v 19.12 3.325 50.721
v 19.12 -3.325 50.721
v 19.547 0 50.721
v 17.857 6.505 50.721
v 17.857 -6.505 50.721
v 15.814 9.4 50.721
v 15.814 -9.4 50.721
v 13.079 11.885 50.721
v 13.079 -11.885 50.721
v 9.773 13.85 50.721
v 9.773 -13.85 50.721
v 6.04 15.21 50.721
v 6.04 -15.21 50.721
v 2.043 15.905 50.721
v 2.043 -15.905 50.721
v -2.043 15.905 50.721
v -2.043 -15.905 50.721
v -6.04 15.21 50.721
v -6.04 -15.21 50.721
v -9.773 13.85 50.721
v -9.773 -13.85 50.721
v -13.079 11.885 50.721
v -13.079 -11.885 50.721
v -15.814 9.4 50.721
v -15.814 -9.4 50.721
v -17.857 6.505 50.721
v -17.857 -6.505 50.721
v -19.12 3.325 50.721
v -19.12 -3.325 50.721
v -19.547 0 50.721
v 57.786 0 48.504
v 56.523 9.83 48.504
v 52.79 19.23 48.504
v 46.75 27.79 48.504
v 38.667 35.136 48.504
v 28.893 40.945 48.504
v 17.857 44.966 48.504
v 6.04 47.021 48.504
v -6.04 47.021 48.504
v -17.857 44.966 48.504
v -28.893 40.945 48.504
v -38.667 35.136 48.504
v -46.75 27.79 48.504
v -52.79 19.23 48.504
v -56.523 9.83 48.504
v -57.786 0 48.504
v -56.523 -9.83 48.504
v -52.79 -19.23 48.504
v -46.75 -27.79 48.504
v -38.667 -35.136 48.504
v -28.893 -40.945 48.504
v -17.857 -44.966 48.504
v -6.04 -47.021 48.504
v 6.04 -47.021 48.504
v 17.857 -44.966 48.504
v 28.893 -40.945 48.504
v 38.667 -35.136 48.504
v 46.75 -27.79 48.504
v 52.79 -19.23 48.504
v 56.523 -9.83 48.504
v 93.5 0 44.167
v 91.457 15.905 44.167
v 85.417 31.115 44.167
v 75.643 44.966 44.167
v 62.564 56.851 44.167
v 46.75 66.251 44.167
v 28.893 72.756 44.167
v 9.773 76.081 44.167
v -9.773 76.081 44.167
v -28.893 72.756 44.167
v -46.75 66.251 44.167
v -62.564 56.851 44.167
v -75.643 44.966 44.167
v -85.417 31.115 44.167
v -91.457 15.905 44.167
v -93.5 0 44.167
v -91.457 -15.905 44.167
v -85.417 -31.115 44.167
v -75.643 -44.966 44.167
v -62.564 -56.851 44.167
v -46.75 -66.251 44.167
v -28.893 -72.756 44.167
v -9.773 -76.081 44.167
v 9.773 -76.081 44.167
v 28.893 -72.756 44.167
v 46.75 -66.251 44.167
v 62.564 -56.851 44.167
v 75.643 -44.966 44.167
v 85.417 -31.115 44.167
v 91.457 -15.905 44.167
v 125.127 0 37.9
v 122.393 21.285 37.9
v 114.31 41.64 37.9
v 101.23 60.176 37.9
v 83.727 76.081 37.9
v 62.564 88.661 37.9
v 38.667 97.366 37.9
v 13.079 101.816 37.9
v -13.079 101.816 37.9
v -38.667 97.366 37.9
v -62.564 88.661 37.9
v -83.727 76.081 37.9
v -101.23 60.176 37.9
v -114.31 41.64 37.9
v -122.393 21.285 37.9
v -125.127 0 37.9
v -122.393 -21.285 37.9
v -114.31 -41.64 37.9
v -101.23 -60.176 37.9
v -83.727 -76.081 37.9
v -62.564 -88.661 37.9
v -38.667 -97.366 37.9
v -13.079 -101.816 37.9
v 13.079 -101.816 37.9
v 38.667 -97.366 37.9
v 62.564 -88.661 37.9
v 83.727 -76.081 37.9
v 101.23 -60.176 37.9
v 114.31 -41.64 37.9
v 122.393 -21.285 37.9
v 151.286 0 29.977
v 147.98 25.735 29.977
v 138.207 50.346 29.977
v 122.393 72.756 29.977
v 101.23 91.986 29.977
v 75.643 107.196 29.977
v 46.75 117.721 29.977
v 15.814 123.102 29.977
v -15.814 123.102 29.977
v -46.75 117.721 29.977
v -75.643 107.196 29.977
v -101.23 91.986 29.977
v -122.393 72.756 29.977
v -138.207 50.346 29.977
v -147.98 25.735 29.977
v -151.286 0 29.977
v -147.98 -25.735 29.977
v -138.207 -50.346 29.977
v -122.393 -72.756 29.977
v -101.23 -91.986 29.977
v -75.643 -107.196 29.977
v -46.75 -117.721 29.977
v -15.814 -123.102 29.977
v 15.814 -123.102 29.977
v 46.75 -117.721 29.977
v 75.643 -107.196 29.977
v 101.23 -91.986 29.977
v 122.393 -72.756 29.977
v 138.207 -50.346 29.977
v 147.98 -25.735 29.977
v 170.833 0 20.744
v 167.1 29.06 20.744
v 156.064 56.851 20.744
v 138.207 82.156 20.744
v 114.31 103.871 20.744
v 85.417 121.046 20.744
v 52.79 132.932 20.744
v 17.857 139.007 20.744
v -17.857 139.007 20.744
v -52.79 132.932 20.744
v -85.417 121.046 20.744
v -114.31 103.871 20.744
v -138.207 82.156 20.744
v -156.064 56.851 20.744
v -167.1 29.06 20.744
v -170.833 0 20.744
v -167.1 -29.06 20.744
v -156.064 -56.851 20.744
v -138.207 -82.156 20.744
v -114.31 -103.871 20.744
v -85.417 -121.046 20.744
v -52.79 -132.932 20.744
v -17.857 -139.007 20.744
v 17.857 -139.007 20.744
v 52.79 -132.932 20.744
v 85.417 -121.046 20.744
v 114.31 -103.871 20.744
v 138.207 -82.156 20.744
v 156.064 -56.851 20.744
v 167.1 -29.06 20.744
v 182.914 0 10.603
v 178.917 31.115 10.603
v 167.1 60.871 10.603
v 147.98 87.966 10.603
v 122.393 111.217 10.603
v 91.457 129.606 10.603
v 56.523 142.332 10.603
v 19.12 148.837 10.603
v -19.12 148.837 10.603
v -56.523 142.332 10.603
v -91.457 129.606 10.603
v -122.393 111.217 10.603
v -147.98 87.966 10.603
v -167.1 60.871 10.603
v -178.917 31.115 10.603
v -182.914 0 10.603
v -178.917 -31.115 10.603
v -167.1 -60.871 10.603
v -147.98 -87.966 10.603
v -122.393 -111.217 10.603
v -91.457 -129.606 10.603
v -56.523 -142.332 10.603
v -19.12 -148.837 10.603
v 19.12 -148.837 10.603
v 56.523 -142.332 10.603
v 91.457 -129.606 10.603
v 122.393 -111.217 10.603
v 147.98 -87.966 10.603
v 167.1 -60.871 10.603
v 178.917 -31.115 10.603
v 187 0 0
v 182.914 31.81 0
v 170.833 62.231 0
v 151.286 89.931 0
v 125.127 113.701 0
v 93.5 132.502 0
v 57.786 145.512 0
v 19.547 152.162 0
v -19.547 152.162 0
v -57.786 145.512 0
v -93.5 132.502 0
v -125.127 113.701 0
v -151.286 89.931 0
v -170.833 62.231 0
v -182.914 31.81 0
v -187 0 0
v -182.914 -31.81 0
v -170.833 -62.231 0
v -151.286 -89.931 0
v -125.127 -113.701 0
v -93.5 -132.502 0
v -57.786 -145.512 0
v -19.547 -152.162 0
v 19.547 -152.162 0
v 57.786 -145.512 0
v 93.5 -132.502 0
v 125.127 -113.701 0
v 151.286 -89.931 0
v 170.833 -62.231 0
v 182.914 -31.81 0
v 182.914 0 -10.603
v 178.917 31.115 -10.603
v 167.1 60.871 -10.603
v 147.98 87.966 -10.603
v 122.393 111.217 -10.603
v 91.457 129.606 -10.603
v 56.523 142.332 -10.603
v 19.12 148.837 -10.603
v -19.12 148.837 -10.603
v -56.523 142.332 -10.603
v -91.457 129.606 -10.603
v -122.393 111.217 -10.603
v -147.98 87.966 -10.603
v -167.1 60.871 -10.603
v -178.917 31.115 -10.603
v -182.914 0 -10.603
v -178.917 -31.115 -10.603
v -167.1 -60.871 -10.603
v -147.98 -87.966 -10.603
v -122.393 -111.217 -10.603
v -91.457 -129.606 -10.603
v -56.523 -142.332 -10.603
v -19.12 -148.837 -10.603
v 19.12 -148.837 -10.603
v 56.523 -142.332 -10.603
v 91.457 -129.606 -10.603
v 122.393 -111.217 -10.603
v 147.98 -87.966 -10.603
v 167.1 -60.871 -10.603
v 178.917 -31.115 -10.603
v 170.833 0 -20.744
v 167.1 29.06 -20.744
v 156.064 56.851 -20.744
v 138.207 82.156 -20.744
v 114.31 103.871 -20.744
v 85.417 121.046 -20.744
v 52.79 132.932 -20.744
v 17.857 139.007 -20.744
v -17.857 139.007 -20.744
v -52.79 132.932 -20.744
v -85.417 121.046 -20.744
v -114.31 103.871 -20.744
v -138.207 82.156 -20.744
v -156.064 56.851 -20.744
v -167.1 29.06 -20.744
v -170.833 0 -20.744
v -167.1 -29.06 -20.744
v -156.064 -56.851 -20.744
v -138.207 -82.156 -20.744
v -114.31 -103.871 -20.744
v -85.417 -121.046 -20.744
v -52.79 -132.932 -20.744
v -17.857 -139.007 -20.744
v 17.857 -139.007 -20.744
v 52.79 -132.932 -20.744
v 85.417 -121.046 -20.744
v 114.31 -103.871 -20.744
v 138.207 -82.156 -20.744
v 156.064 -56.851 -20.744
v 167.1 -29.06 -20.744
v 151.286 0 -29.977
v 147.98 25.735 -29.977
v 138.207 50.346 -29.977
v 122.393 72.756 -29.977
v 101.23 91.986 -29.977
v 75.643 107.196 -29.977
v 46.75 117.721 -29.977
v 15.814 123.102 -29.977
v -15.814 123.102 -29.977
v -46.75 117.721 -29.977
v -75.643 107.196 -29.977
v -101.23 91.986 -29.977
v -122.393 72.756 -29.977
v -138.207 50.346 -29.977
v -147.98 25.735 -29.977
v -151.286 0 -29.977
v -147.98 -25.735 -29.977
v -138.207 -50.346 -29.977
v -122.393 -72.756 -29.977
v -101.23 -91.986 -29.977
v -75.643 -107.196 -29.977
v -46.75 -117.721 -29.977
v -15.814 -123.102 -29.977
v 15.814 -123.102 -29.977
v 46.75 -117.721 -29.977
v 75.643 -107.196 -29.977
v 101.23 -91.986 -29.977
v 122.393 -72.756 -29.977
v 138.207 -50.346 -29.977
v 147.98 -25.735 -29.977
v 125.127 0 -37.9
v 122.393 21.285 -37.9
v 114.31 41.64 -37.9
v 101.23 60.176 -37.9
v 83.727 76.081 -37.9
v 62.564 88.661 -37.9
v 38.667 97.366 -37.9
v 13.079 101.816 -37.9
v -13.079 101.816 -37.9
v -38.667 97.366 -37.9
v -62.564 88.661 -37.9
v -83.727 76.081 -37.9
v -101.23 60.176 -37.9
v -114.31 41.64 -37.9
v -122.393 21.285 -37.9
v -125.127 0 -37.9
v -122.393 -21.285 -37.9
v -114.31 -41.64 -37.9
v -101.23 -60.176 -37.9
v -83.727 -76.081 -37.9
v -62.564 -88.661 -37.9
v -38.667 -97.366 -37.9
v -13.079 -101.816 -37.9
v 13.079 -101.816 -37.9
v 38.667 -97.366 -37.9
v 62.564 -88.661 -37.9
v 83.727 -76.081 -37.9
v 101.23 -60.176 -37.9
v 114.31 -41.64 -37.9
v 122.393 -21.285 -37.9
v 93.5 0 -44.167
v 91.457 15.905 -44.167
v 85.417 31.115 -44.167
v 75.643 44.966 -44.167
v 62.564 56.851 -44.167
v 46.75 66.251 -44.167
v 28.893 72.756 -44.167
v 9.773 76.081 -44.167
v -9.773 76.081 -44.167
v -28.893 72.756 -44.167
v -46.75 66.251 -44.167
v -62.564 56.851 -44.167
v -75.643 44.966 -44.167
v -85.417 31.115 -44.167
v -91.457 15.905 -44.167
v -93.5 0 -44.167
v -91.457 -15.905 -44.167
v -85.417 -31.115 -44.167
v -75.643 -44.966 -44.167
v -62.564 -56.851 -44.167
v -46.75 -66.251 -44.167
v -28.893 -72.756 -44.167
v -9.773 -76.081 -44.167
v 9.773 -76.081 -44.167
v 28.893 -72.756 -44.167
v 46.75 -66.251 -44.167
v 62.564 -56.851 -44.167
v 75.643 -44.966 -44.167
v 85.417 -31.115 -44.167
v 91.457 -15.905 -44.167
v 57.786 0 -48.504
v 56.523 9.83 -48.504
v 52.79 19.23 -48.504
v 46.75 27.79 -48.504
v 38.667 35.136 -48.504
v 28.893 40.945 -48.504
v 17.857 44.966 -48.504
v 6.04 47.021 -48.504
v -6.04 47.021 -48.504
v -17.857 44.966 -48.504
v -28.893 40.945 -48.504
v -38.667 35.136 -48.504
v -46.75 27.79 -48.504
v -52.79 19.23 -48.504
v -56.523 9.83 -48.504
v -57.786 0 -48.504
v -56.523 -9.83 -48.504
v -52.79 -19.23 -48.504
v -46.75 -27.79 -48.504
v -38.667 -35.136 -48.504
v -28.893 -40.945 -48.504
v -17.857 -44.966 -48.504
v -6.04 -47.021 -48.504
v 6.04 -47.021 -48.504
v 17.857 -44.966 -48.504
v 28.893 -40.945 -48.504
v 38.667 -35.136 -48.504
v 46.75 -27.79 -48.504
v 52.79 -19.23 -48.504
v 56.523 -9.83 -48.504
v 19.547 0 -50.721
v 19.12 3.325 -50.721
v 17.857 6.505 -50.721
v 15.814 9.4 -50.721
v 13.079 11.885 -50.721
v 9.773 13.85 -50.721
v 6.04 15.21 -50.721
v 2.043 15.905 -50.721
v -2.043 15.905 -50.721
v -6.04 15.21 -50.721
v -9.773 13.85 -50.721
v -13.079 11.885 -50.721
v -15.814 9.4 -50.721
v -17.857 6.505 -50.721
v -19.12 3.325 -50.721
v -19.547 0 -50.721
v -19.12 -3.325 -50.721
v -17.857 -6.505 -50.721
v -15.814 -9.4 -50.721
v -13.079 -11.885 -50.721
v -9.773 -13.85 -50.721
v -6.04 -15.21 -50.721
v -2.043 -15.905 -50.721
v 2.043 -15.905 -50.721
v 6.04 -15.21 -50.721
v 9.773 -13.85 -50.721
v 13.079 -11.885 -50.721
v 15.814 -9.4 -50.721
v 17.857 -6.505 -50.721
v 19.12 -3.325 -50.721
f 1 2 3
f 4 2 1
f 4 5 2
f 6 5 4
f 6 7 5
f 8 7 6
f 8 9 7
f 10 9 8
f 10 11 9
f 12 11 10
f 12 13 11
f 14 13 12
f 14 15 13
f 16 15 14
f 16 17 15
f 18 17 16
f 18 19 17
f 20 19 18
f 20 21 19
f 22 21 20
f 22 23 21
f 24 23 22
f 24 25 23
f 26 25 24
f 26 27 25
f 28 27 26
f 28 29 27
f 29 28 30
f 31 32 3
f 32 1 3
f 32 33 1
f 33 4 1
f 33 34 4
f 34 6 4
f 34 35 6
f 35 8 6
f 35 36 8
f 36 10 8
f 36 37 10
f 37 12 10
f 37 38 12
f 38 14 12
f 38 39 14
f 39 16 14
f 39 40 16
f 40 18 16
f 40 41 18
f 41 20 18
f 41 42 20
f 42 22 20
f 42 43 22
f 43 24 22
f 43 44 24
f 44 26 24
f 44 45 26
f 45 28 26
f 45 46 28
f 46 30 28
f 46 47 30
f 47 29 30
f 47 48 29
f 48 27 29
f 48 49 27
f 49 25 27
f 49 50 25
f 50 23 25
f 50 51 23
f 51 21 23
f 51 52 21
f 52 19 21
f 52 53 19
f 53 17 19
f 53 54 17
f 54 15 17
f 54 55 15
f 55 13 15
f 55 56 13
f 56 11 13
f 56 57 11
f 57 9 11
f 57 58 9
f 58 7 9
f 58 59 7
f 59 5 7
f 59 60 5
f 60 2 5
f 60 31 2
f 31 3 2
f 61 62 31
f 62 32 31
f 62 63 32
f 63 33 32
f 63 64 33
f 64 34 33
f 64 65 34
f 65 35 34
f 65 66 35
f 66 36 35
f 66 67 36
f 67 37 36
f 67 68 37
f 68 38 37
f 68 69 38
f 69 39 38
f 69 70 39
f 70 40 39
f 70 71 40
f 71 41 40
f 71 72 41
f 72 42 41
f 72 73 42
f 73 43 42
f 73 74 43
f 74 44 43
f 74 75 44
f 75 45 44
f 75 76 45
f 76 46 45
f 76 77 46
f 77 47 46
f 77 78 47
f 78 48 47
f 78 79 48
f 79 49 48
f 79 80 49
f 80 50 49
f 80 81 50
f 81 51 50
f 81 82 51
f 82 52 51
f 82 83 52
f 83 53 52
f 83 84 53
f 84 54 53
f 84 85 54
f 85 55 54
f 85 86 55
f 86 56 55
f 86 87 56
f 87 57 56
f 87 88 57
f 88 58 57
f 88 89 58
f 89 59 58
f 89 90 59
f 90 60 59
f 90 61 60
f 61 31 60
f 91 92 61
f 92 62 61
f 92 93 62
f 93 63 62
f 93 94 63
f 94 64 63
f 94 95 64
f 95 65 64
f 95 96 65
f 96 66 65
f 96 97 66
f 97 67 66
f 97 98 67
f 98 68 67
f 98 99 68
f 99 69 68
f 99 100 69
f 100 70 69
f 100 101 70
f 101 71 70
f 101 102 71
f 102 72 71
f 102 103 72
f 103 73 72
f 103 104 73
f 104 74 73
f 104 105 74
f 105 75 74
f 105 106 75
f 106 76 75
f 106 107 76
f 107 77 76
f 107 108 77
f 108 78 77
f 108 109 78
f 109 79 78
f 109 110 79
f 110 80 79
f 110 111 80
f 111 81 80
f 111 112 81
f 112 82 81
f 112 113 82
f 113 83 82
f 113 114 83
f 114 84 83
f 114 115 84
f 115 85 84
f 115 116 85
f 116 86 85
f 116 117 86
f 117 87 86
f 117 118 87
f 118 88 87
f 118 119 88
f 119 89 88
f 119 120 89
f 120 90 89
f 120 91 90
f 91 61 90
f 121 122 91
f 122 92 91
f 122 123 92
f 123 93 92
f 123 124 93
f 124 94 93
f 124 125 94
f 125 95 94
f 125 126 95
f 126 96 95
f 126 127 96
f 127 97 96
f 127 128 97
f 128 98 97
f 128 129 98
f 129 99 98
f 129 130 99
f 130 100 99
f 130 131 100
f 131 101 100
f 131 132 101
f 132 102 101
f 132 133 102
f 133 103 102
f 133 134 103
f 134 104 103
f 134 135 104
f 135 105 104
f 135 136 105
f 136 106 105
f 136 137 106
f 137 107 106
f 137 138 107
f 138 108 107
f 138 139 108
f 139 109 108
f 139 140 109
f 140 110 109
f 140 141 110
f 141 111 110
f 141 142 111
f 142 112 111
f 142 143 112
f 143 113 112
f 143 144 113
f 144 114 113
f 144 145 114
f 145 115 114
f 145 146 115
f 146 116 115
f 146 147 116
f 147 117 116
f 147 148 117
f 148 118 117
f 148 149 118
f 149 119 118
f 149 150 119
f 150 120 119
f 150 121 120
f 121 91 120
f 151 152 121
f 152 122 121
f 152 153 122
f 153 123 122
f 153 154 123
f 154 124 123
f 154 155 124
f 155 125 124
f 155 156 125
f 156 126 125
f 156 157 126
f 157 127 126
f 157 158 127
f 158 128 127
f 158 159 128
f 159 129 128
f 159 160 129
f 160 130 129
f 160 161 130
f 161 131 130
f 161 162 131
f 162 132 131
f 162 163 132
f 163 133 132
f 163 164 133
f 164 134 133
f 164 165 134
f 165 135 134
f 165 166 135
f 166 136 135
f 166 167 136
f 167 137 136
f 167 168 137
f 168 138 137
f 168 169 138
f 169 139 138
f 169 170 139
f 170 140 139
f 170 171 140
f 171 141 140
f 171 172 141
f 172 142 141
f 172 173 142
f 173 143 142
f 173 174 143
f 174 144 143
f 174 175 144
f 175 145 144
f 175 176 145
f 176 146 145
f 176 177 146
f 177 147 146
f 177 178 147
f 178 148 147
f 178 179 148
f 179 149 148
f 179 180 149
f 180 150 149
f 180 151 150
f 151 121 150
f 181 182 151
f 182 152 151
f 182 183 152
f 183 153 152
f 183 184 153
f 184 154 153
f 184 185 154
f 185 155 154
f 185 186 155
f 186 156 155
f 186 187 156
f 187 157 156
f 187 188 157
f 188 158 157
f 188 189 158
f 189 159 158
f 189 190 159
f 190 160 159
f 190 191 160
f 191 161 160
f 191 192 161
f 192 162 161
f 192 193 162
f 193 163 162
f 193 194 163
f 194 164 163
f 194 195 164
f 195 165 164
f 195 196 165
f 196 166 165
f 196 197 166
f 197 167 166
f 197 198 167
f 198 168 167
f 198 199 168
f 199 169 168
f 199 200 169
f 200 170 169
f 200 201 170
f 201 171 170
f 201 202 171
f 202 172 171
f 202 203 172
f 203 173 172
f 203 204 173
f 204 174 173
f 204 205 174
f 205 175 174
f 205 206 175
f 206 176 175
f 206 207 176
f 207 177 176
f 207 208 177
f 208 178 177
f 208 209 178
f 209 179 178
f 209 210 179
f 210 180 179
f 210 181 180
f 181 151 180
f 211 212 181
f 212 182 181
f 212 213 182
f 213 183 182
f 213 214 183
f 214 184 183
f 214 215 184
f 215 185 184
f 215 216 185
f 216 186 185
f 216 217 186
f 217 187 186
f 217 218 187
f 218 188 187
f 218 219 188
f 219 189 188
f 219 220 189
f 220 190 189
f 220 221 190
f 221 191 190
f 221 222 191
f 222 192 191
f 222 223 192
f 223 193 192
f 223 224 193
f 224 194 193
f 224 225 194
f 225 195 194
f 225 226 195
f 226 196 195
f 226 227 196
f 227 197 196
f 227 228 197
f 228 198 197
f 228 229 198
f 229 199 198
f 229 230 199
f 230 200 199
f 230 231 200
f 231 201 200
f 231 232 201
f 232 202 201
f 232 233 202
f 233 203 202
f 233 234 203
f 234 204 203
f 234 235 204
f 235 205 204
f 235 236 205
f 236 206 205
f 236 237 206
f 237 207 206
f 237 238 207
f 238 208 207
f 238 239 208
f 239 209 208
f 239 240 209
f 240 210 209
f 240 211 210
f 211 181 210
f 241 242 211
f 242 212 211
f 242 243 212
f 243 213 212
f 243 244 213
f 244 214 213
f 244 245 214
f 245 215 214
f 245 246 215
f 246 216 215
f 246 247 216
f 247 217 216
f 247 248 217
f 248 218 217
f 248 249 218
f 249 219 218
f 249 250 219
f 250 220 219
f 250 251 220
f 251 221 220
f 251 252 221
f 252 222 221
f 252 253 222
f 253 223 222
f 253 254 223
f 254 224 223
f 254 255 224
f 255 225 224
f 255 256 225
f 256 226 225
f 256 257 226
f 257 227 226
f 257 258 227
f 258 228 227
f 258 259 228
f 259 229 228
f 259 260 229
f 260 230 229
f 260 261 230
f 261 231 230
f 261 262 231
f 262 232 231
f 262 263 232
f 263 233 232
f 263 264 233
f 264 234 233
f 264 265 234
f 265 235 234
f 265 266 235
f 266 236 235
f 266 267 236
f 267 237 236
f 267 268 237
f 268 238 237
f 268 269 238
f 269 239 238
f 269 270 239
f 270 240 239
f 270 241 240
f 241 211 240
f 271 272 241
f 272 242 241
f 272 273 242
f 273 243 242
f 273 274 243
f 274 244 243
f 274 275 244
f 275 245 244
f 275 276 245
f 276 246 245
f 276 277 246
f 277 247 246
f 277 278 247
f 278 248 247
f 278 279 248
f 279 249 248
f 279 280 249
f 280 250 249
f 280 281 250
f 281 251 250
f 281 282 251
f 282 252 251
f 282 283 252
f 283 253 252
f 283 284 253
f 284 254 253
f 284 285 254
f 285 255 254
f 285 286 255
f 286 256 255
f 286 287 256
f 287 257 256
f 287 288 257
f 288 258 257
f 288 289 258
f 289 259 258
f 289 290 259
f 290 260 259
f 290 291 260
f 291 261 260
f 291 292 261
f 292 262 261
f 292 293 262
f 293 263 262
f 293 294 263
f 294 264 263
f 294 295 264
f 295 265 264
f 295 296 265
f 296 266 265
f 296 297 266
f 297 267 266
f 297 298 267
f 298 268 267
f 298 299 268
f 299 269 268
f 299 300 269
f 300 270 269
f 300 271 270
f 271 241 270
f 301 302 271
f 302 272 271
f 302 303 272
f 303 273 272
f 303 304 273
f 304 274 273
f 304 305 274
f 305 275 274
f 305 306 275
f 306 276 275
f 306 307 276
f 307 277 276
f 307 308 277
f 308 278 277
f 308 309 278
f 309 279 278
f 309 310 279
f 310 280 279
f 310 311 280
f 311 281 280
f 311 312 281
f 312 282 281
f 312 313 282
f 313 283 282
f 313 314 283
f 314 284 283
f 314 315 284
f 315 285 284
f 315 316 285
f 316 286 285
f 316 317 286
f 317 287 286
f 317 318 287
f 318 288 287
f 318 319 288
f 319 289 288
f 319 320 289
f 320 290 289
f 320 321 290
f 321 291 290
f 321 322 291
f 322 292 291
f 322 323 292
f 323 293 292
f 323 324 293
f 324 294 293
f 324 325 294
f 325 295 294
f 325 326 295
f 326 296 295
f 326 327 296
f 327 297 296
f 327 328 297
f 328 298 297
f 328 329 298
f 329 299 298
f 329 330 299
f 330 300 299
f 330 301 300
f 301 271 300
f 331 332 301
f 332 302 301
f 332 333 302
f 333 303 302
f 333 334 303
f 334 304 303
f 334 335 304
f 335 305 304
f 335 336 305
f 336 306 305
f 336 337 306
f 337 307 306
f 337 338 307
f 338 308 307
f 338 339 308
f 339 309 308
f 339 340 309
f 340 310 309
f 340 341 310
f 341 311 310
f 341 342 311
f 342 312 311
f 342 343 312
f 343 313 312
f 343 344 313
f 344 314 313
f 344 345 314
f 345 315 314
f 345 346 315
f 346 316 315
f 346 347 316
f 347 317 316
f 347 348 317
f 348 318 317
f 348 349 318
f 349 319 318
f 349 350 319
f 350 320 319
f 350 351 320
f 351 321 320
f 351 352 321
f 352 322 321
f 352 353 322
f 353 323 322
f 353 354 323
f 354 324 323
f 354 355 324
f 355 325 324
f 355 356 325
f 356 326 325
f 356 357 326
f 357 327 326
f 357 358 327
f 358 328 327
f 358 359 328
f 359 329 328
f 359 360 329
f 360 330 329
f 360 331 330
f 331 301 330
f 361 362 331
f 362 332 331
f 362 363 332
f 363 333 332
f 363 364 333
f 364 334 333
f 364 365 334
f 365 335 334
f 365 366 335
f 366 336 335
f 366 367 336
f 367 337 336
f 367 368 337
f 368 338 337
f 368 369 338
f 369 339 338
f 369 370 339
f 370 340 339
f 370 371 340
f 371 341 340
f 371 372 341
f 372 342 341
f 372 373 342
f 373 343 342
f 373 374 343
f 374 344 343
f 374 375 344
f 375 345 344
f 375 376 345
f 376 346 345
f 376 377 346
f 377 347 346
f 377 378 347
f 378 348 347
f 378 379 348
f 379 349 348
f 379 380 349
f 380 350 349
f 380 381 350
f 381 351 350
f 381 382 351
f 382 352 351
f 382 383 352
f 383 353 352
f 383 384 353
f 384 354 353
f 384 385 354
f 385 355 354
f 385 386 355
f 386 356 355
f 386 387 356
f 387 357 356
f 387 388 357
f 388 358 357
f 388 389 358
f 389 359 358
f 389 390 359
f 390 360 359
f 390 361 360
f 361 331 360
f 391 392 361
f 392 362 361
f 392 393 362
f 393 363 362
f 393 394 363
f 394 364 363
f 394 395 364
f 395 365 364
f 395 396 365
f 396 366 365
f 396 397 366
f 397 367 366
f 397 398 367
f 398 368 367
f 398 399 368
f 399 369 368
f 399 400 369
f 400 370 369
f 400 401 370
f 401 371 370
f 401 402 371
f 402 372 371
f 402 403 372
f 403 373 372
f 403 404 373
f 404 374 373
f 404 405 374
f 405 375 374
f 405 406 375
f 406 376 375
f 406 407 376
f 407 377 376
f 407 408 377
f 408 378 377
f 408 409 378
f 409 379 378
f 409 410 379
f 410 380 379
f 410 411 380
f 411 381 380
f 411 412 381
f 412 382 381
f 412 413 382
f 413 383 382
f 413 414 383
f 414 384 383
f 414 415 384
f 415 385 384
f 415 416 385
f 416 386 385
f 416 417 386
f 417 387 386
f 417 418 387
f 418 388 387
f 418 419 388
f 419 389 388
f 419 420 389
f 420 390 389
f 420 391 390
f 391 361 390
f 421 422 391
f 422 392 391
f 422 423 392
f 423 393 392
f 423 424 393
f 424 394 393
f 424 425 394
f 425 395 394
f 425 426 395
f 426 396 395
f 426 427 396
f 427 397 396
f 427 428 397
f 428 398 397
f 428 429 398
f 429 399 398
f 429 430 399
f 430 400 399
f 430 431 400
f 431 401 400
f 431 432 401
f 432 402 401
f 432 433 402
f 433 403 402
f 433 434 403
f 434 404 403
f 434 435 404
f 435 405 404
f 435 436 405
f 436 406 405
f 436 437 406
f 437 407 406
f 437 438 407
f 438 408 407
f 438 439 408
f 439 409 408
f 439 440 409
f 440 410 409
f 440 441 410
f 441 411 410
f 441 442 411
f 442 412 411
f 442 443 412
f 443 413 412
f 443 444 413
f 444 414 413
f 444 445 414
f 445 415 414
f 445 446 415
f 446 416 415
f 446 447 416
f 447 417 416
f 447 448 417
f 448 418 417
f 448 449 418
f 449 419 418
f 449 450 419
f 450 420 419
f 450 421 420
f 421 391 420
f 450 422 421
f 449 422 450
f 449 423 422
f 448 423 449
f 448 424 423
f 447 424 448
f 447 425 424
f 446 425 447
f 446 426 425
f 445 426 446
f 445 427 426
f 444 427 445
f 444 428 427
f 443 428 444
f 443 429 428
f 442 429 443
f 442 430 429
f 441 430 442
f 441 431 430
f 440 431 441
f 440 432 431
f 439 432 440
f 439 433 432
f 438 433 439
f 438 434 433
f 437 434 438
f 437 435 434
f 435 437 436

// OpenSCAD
// Generated by SolidPython 1.0.1 on 2020-07-29 00:46:49


scale(v = [11, 9, 3]) {
	sphere(r = 17);
}
/***********************************************
*********      SolidPython code:      **********
************************************************
 
# import packages: SolidPython
from solid import *
from solid.utils import *
from itertools import chain, combinations, permutations


class Resize:

    def __init__(self, scad_file):
        self.scad_file = scad_file
        #self.scad_file = import_scad(scad_file)
        # cone/cylinder param:
        self.r1 = 0
        self.r2 = 0
        self.h = 0
        # rectangular prism param:
        self.w = 0
        self.l = 0
        # ellipse param:
        self.r = 0

    # import OpenScad code (file name corresponds to shape)


    # classify shape + parameters
    def assign(self, param1, param2, param3):
        if self.scad_file == 'cone.scad':
            self.r1 = param1
            self.r2 = param2
            self.h = param3
        elif self.scad_file == 'cylinder.scad':
            self.r1 = param1
            self.r2 = param2
            self.h = param3
        elif self.scad_file == 'rectangularPrism.scad':
            self.h = param1
            self.l = param2
            self.w = param3
        else:
            self.r = param1
            self.h = param2

    # resize parameters
    def iterate(self):
        x = range(3, 20, 2)
        i = 1
        if self.scad_file == 'cone.scad':
            tempList = list(permutations(x, 2))
            for temp in tempList:
                param1 = temp[0]
                param2 = temp[1]
                filepath = 'produced_scad_files/' + 'cone' + str(param1) + '_' + str(param2) + '_' + '.scad'
                scad_render_to_file(cylinder(h=param1, r1=param2, r2=0), filepath)

        elif self.scad_file == 'cylinder.scad':
            tempList = list(permutations(x, 3))
            for temp in tempList:
                param1 = temp[0]
                param2 = temp[1]
                filepath = 'produced_scad_files/' + 'cylinder' + str(param1) + '_' + str(param2) + '_' + '.scad'
                scad_render_to_file(cylinder(h=param1, r1=param2, r2=param2), filepath)

        elif self.scad_file == 'rectangularPrism.scad':
            tempList = list(permutations(x, 3))
            for temp in tempList:
                param1 = temp[0]
                param2 = temp[1]
                param3 = temp[2]
                filepath = 'produced_scad_files/' + 'rectangularPrism' + str(param1) + '_' + str(param2) + '_' + str(
                    param3) + '.scad'
                scad_render_to_file(cube(size=(param1, param2, param3)), filepath)

        elif self.scad_file == 'ellipse.scad':
            tempList = list(permutations(x, 4))
            for temp in tempList:
                param1 = temp[0]
                param2 = temp[1]
                param3 = temp[2]
                param4 = temp[3]
                filepath = 'produced_scad_files/' + 'ellipse' + str(param1) + '_' + str(param2) + '_' + str(param3) + '_' + str(param4) + '.scad'
                scad_render_to_file(scale([param1, param2, param3])(sphere(r=param4)), filepath)

    def render_to_scadfile(self):
        scad_render_to_file(scad, 'example.scad') 
 
************************************************/
